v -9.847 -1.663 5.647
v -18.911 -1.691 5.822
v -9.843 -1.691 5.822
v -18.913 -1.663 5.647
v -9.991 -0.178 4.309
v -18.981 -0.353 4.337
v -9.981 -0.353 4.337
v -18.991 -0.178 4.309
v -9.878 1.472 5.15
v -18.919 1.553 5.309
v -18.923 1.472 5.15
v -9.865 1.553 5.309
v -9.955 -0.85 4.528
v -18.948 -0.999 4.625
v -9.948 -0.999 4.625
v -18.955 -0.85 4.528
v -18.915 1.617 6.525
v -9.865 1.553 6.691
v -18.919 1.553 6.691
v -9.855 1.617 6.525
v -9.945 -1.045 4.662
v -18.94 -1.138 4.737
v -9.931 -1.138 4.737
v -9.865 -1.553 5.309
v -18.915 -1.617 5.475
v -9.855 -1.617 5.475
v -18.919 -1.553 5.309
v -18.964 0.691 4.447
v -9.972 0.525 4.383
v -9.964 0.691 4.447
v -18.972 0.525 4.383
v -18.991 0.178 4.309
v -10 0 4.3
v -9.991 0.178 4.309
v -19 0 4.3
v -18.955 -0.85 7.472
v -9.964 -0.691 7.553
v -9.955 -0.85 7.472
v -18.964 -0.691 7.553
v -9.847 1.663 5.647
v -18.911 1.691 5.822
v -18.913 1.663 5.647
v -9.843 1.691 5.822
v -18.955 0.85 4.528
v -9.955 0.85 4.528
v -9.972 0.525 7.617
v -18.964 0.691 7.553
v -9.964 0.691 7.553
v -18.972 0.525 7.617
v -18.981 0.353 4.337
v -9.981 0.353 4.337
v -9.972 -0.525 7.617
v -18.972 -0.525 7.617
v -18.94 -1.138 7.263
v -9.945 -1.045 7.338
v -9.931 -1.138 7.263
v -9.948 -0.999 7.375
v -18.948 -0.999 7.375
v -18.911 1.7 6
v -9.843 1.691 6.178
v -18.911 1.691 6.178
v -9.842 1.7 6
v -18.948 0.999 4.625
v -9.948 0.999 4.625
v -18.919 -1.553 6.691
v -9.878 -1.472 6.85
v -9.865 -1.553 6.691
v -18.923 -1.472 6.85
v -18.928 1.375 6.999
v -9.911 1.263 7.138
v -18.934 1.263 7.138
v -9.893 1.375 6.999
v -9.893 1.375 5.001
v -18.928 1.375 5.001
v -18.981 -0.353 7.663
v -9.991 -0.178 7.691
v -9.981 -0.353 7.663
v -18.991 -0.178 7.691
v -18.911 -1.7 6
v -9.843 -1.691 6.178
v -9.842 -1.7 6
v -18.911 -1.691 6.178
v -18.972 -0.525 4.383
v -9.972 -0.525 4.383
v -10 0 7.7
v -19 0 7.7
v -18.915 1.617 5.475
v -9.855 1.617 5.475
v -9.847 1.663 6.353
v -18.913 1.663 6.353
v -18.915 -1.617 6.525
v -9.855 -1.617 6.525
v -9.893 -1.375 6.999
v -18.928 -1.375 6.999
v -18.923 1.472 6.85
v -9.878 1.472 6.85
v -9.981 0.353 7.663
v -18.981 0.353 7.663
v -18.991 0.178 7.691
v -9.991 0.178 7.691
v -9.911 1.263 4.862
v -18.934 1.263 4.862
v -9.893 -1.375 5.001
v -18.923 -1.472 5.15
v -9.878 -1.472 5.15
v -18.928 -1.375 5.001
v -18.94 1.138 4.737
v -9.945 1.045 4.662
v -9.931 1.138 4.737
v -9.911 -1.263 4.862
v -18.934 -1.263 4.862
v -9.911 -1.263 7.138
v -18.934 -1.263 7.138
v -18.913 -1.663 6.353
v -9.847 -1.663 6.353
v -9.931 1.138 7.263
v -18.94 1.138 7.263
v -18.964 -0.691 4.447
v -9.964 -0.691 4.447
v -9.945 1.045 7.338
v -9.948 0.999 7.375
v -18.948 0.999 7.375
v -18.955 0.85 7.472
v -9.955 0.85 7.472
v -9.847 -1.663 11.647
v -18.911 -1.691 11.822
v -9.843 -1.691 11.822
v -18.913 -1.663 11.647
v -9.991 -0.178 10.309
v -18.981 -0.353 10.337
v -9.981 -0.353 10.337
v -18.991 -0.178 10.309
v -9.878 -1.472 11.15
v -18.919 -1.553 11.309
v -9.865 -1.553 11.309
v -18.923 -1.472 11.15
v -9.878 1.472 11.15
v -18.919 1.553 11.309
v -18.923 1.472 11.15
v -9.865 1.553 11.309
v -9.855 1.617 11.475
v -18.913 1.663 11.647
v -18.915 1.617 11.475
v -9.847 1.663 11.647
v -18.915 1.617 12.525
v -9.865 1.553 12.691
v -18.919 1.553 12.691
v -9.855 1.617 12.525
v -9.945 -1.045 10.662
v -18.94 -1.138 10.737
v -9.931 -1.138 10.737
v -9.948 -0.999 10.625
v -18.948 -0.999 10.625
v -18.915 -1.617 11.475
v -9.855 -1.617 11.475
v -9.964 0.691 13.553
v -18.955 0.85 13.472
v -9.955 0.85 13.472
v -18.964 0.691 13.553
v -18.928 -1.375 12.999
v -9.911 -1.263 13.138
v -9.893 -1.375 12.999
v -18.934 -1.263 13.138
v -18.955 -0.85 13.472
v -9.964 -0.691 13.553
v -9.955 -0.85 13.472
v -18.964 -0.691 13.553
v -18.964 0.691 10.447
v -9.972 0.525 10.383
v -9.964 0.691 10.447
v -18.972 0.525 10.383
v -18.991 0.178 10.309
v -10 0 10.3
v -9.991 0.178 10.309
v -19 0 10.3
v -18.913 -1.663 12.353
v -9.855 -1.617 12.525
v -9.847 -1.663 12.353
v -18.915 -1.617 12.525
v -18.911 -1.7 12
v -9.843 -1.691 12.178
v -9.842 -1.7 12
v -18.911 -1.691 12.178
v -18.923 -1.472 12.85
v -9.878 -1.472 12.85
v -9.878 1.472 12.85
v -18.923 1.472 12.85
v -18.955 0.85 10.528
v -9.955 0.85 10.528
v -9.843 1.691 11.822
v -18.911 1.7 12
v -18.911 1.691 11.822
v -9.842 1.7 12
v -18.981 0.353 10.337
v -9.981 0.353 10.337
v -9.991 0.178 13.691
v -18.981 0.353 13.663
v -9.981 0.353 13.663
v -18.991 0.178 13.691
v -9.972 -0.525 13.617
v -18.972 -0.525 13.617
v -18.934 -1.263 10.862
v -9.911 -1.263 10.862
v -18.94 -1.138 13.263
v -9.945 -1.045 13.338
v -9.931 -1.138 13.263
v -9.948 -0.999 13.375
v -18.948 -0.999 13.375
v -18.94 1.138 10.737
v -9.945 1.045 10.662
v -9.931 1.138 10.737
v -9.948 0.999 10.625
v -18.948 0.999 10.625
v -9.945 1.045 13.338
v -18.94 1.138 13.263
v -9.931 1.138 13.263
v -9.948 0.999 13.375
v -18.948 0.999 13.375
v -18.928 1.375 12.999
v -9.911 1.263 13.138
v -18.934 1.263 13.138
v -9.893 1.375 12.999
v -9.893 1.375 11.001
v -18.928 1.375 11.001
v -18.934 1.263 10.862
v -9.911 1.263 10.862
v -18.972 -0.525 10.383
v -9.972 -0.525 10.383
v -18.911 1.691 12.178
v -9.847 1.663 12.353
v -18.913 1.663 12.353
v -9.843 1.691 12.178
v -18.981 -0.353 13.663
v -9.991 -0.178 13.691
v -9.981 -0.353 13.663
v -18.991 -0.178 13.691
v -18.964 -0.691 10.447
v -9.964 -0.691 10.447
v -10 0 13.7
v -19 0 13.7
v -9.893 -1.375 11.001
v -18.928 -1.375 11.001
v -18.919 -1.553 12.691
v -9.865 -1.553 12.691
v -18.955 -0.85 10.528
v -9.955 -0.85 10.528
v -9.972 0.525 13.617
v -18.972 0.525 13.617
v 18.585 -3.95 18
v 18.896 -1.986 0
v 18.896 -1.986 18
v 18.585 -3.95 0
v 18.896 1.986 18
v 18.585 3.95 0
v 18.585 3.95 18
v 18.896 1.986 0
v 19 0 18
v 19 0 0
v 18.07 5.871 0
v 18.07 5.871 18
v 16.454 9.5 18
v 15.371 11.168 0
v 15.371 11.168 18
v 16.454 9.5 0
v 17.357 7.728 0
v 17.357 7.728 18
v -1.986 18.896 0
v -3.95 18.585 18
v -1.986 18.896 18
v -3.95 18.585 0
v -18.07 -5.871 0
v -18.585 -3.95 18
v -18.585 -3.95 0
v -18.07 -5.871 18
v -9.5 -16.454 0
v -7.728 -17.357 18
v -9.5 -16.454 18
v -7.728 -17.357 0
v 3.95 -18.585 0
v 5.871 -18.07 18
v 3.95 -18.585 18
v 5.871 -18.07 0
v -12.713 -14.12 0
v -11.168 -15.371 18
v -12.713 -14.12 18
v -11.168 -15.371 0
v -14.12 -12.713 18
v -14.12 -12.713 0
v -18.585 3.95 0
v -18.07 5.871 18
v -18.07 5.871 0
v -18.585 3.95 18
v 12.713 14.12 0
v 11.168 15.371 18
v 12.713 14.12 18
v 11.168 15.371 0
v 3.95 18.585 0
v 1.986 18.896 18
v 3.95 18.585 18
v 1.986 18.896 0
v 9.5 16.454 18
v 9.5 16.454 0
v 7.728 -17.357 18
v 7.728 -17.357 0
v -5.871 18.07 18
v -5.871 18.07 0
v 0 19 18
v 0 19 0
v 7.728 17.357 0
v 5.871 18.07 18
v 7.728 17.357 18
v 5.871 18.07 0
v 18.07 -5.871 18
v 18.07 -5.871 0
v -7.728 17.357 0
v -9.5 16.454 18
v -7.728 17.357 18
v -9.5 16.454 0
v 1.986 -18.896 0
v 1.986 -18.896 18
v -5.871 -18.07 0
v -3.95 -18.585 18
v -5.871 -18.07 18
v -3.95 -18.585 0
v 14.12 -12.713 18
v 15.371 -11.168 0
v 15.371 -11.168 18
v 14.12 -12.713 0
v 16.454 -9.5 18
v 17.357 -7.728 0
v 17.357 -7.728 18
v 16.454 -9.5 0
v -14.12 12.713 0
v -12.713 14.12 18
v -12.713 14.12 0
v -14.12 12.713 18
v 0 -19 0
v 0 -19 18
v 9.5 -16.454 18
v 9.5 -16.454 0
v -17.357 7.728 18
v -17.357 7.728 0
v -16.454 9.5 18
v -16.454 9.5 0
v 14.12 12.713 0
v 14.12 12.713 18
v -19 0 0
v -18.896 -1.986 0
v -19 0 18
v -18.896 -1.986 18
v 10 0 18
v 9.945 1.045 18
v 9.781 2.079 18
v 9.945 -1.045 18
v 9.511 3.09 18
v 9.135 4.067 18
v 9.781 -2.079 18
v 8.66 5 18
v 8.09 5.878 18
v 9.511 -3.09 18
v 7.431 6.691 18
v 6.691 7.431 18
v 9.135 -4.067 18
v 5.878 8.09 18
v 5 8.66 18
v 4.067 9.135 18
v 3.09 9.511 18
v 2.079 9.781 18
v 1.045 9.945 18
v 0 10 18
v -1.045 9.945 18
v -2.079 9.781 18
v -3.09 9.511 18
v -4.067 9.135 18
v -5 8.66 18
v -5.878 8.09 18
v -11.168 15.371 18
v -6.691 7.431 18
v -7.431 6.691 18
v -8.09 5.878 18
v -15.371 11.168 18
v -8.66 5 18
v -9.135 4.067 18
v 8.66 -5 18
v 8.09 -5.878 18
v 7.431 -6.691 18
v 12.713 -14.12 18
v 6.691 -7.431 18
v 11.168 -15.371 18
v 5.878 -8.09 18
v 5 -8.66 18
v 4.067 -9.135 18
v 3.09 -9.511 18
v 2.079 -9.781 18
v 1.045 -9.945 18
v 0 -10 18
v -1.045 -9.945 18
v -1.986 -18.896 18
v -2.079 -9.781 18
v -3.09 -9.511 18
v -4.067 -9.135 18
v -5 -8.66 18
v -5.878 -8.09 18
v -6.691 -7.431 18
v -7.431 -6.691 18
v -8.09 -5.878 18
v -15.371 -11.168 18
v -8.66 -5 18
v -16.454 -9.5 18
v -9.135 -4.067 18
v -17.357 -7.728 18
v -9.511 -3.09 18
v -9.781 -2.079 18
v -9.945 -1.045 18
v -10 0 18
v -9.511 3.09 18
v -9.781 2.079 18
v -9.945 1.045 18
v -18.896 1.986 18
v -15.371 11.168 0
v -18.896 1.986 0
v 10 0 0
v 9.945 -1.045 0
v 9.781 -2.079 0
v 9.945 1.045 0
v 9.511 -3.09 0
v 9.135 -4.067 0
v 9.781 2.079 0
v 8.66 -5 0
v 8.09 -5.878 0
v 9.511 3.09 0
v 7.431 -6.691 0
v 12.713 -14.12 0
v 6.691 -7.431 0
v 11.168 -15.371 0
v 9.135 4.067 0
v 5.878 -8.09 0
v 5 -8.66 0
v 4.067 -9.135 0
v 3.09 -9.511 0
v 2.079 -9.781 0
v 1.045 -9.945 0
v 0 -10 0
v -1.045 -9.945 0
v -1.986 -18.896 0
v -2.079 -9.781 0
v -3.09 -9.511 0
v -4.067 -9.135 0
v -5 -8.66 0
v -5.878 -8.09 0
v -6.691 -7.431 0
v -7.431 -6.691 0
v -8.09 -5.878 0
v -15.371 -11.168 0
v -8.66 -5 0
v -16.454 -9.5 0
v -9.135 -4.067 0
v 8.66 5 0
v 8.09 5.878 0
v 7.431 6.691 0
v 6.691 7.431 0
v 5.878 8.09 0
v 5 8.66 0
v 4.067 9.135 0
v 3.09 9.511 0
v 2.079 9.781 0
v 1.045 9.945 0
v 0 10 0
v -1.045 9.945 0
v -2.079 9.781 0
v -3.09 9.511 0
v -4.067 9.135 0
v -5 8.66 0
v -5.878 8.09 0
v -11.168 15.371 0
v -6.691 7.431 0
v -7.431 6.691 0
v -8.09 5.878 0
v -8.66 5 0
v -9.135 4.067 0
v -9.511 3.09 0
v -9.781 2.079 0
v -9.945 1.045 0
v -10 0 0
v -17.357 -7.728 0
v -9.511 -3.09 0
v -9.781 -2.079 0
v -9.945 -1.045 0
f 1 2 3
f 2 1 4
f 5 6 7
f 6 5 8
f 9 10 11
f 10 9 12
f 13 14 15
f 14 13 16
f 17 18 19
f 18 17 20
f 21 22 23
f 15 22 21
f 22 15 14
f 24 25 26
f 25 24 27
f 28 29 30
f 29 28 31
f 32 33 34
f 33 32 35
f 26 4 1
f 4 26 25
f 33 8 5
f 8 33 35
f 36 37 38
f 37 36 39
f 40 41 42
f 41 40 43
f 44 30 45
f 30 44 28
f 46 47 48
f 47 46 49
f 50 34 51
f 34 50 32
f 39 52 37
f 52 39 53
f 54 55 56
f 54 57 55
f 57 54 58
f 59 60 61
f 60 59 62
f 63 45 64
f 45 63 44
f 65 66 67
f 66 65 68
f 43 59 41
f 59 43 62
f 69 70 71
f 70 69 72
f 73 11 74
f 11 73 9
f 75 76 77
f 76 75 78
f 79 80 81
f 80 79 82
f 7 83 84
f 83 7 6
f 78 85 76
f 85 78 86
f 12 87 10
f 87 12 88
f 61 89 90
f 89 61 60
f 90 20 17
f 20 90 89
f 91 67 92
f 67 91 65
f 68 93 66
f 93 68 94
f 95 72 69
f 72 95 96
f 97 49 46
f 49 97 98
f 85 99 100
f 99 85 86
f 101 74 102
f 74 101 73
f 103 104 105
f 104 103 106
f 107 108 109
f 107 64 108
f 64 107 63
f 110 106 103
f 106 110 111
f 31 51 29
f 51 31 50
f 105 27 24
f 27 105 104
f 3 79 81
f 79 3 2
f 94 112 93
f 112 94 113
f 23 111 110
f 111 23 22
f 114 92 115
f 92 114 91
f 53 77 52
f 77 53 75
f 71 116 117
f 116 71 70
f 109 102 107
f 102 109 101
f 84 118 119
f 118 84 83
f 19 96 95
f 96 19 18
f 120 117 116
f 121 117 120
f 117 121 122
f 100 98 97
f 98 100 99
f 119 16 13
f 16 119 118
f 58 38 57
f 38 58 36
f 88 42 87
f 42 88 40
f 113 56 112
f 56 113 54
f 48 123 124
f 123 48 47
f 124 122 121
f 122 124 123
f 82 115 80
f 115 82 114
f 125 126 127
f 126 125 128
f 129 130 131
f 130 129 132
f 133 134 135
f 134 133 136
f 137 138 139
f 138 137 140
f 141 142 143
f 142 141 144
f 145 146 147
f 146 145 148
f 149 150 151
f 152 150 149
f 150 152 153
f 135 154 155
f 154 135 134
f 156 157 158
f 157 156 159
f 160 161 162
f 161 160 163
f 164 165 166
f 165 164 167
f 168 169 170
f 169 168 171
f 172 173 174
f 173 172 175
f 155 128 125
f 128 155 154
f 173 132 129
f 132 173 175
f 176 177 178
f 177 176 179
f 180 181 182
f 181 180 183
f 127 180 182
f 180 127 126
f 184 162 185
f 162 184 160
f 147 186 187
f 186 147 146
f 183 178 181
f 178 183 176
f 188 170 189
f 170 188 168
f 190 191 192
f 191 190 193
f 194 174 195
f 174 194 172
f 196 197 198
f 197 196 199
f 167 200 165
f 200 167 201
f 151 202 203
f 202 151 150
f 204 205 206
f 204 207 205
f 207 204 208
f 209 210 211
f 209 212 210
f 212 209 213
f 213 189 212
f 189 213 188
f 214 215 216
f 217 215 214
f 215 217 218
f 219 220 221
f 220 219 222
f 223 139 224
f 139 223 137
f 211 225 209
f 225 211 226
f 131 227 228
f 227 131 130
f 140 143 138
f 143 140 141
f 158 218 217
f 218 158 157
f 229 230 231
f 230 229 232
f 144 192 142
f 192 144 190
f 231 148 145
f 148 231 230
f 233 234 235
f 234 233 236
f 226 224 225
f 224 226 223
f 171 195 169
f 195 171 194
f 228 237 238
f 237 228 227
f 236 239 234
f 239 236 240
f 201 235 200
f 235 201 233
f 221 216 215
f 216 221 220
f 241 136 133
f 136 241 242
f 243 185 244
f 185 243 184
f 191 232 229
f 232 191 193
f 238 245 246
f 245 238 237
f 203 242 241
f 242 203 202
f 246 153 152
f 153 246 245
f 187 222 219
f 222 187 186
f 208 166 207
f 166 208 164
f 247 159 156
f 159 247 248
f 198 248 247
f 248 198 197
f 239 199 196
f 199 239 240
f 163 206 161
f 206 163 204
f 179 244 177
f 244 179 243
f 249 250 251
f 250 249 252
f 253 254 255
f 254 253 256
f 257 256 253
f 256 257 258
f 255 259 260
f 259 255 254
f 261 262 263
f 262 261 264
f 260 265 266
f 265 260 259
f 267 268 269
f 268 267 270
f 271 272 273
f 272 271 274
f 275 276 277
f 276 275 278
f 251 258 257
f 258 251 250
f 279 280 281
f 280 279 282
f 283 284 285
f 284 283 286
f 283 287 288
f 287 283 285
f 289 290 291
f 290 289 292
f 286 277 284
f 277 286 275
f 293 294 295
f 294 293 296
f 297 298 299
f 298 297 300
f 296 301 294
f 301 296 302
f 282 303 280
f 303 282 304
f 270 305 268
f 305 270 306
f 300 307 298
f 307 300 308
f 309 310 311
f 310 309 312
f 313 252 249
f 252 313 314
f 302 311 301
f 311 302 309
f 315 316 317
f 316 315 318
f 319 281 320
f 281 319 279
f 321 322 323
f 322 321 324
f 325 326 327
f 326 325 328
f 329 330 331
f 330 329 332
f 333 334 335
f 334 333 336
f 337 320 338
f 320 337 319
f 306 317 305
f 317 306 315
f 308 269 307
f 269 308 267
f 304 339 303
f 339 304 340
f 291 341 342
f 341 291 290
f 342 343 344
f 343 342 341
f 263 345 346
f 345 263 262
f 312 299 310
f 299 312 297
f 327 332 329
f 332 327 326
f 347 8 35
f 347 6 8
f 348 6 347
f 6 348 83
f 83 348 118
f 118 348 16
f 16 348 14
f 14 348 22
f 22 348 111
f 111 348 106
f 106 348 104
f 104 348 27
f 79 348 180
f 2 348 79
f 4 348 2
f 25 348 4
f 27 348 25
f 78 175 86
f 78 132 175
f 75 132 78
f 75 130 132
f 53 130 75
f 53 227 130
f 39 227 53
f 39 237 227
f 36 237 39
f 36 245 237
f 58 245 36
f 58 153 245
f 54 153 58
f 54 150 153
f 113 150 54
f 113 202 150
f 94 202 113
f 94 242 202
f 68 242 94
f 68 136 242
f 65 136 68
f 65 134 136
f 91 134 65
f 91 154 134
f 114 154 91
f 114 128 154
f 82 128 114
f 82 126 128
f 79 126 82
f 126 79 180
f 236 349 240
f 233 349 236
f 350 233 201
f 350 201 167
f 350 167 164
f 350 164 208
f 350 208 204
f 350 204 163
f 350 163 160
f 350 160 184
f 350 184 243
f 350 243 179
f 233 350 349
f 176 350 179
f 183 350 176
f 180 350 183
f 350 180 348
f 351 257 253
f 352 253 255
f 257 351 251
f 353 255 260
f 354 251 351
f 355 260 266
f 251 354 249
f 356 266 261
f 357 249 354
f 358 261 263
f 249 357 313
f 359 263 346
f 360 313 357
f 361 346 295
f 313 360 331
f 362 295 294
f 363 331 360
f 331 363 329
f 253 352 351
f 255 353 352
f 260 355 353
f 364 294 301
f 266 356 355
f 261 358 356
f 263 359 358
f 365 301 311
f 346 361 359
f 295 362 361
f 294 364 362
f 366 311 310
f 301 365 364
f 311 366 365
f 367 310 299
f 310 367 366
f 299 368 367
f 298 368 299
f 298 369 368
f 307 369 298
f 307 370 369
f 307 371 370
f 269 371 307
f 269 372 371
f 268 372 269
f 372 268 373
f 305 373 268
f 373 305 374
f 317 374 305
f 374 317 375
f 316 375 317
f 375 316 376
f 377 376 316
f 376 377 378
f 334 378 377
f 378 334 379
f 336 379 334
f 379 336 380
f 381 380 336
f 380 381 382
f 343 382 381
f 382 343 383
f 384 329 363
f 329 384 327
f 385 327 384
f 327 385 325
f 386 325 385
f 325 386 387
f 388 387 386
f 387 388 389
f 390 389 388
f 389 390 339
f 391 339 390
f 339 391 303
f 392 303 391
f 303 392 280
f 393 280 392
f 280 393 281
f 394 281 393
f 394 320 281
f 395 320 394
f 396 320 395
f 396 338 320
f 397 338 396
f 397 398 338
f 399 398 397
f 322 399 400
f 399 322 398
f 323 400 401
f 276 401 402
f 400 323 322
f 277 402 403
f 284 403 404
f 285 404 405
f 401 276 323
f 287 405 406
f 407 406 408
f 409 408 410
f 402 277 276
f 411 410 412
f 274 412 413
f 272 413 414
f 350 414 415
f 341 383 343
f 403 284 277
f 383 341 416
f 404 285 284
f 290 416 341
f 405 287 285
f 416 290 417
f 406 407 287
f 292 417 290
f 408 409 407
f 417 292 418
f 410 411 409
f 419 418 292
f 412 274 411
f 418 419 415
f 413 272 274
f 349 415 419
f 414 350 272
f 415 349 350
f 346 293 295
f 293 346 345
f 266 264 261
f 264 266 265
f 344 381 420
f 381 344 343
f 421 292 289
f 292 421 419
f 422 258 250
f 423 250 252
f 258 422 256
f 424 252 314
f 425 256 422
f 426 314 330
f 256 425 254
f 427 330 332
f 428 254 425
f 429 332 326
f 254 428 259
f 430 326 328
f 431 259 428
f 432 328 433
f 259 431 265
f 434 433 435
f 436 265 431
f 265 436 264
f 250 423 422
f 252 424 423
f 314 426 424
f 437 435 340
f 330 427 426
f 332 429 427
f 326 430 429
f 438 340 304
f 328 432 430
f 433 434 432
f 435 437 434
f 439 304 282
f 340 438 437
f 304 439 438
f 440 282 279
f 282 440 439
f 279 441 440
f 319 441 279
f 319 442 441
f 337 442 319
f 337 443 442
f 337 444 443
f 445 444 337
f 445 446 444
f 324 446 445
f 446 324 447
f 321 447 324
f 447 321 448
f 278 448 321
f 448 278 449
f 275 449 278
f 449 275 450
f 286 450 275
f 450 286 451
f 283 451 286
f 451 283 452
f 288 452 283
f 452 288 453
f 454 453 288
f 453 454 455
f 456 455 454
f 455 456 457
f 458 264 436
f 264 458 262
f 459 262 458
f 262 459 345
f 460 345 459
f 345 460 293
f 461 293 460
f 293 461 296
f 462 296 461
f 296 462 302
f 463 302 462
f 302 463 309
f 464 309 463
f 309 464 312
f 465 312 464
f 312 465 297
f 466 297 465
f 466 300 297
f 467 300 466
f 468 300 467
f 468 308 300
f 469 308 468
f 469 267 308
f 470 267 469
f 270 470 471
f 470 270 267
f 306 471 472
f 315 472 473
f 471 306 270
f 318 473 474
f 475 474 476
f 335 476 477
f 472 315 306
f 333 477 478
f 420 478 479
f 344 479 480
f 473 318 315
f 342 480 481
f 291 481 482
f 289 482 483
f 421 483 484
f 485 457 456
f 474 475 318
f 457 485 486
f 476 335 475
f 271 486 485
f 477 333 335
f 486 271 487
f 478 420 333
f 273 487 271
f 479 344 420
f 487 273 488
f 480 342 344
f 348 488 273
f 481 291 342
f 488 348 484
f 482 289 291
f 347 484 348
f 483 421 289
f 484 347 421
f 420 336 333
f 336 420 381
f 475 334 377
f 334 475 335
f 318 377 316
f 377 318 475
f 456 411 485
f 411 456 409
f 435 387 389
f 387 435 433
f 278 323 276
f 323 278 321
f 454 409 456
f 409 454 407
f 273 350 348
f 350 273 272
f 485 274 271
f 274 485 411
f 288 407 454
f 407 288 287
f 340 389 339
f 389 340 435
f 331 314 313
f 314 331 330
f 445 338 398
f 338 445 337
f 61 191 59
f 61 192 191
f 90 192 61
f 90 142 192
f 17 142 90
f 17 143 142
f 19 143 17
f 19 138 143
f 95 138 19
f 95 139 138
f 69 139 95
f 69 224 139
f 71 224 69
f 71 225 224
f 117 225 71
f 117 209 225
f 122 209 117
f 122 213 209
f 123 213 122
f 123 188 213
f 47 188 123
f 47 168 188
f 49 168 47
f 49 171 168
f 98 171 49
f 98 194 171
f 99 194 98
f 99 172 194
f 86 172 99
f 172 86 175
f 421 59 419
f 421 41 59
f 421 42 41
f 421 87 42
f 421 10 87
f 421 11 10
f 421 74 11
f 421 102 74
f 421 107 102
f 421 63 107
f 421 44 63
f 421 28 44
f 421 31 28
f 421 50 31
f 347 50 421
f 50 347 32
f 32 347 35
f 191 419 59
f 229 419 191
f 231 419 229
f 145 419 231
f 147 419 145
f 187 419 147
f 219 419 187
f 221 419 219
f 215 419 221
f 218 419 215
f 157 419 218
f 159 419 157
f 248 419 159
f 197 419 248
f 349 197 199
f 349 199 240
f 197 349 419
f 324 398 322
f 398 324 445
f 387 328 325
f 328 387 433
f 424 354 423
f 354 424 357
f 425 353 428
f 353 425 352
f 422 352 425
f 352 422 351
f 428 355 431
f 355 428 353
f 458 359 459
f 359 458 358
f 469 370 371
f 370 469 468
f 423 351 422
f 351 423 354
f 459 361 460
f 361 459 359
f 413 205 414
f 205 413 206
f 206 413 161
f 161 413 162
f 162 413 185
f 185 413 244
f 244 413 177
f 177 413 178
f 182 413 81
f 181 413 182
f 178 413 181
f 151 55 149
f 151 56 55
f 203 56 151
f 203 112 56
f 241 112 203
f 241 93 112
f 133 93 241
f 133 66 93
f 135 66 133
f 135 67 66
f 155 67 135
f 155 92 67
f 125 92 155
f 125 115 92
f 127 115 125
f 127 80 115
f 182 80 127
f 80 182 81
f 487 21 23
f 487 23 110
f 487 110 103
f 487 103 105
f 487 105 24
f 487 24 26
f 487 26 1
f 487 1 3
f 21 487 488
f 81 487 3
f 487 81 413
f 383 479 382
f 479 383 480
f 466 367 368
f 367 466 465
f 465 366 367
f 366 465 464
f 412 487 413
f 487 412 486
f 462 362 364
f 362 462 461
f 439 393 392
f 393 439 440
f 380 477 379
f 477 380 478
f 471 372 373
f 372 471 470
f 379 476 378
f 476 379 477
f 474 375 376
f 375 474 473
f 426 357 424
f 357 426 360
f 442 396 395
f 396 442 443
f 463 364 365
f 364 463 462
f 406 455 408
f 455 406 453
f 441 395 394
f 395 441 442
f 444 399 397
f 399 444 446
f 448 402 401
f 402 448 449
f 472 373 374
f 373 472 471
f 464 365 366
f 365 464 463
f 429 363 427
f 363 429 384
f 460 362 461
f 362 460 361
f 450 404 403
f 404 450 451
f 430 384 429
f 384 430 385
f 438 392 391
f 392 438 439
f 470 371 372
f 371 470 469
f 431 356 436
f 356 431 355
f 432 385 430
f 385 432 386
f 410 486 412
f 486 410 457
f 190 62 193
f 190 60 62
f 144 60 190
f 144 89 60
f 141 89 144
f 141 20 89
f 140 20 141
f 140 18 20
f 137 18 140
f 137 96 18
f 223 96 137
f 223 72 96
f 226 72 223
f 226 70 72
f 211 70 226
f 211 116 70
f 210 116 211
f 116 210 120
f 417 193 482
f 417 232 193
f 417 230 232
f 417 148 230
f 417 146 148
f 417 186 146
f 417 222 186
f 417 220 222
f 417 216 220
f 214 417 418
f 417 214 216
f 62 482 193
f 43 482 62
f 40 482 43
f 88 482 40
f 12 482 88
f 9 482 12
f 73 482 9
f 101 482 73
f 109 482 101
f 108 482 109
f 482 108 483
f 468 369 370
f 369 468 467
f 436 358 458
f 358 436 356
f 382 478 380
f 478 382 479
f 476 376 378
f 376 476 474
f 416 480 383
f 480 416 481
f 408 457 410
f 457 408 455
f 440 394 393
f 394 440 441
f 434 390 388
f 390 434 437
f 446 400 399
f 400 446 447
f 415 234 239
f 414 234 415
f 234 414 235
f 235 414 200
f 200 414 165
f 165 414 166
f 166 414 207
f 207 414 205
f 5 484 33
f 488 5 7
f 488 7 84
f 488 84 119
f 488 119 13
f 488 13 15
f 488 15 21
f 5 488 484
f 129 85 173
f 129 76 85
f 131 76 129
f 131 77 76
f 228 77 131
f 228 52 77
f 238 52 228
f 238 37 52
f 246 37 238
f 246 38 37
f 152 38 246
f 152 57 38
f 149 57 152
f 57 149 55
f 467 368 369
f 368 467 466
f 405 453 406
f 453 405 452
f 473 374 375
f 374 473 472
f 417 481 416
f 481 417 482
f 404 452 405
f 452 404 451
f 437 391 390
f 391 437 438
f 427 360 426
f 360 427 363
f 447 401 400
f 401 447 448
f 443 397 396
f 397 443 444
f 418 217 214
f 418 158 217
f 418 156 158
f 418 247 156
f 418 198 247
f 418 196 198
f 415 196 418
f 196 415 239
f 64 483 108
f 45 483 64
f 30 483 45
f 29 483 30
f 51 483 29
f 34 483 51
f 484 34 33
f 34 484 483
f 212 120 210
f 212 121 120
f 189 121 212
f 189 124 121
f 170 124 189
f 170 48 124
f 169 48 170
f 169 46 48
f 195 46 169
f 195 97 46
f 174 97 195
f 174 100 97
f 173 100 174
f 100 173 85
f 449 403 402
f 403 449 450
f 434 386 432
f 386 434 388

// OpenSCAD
// Double-screw locking collar.
$fn = 60;
eps = 0.02;
shaft_d = 20;
outer_d = 38;
width = 18;
difference() {
    cylinder(d=outer_d,h=width);
    translate([0,0,-eps]) cylinder(d=shaft_d,h=width+2*eps);
    for (z=[width/3,2*width/3]) translate([-outer_d/2-eps,0,z]) rotate([0,90,0]) cylinder(d=3.4,h=outer_d/2+2*eps);
}
